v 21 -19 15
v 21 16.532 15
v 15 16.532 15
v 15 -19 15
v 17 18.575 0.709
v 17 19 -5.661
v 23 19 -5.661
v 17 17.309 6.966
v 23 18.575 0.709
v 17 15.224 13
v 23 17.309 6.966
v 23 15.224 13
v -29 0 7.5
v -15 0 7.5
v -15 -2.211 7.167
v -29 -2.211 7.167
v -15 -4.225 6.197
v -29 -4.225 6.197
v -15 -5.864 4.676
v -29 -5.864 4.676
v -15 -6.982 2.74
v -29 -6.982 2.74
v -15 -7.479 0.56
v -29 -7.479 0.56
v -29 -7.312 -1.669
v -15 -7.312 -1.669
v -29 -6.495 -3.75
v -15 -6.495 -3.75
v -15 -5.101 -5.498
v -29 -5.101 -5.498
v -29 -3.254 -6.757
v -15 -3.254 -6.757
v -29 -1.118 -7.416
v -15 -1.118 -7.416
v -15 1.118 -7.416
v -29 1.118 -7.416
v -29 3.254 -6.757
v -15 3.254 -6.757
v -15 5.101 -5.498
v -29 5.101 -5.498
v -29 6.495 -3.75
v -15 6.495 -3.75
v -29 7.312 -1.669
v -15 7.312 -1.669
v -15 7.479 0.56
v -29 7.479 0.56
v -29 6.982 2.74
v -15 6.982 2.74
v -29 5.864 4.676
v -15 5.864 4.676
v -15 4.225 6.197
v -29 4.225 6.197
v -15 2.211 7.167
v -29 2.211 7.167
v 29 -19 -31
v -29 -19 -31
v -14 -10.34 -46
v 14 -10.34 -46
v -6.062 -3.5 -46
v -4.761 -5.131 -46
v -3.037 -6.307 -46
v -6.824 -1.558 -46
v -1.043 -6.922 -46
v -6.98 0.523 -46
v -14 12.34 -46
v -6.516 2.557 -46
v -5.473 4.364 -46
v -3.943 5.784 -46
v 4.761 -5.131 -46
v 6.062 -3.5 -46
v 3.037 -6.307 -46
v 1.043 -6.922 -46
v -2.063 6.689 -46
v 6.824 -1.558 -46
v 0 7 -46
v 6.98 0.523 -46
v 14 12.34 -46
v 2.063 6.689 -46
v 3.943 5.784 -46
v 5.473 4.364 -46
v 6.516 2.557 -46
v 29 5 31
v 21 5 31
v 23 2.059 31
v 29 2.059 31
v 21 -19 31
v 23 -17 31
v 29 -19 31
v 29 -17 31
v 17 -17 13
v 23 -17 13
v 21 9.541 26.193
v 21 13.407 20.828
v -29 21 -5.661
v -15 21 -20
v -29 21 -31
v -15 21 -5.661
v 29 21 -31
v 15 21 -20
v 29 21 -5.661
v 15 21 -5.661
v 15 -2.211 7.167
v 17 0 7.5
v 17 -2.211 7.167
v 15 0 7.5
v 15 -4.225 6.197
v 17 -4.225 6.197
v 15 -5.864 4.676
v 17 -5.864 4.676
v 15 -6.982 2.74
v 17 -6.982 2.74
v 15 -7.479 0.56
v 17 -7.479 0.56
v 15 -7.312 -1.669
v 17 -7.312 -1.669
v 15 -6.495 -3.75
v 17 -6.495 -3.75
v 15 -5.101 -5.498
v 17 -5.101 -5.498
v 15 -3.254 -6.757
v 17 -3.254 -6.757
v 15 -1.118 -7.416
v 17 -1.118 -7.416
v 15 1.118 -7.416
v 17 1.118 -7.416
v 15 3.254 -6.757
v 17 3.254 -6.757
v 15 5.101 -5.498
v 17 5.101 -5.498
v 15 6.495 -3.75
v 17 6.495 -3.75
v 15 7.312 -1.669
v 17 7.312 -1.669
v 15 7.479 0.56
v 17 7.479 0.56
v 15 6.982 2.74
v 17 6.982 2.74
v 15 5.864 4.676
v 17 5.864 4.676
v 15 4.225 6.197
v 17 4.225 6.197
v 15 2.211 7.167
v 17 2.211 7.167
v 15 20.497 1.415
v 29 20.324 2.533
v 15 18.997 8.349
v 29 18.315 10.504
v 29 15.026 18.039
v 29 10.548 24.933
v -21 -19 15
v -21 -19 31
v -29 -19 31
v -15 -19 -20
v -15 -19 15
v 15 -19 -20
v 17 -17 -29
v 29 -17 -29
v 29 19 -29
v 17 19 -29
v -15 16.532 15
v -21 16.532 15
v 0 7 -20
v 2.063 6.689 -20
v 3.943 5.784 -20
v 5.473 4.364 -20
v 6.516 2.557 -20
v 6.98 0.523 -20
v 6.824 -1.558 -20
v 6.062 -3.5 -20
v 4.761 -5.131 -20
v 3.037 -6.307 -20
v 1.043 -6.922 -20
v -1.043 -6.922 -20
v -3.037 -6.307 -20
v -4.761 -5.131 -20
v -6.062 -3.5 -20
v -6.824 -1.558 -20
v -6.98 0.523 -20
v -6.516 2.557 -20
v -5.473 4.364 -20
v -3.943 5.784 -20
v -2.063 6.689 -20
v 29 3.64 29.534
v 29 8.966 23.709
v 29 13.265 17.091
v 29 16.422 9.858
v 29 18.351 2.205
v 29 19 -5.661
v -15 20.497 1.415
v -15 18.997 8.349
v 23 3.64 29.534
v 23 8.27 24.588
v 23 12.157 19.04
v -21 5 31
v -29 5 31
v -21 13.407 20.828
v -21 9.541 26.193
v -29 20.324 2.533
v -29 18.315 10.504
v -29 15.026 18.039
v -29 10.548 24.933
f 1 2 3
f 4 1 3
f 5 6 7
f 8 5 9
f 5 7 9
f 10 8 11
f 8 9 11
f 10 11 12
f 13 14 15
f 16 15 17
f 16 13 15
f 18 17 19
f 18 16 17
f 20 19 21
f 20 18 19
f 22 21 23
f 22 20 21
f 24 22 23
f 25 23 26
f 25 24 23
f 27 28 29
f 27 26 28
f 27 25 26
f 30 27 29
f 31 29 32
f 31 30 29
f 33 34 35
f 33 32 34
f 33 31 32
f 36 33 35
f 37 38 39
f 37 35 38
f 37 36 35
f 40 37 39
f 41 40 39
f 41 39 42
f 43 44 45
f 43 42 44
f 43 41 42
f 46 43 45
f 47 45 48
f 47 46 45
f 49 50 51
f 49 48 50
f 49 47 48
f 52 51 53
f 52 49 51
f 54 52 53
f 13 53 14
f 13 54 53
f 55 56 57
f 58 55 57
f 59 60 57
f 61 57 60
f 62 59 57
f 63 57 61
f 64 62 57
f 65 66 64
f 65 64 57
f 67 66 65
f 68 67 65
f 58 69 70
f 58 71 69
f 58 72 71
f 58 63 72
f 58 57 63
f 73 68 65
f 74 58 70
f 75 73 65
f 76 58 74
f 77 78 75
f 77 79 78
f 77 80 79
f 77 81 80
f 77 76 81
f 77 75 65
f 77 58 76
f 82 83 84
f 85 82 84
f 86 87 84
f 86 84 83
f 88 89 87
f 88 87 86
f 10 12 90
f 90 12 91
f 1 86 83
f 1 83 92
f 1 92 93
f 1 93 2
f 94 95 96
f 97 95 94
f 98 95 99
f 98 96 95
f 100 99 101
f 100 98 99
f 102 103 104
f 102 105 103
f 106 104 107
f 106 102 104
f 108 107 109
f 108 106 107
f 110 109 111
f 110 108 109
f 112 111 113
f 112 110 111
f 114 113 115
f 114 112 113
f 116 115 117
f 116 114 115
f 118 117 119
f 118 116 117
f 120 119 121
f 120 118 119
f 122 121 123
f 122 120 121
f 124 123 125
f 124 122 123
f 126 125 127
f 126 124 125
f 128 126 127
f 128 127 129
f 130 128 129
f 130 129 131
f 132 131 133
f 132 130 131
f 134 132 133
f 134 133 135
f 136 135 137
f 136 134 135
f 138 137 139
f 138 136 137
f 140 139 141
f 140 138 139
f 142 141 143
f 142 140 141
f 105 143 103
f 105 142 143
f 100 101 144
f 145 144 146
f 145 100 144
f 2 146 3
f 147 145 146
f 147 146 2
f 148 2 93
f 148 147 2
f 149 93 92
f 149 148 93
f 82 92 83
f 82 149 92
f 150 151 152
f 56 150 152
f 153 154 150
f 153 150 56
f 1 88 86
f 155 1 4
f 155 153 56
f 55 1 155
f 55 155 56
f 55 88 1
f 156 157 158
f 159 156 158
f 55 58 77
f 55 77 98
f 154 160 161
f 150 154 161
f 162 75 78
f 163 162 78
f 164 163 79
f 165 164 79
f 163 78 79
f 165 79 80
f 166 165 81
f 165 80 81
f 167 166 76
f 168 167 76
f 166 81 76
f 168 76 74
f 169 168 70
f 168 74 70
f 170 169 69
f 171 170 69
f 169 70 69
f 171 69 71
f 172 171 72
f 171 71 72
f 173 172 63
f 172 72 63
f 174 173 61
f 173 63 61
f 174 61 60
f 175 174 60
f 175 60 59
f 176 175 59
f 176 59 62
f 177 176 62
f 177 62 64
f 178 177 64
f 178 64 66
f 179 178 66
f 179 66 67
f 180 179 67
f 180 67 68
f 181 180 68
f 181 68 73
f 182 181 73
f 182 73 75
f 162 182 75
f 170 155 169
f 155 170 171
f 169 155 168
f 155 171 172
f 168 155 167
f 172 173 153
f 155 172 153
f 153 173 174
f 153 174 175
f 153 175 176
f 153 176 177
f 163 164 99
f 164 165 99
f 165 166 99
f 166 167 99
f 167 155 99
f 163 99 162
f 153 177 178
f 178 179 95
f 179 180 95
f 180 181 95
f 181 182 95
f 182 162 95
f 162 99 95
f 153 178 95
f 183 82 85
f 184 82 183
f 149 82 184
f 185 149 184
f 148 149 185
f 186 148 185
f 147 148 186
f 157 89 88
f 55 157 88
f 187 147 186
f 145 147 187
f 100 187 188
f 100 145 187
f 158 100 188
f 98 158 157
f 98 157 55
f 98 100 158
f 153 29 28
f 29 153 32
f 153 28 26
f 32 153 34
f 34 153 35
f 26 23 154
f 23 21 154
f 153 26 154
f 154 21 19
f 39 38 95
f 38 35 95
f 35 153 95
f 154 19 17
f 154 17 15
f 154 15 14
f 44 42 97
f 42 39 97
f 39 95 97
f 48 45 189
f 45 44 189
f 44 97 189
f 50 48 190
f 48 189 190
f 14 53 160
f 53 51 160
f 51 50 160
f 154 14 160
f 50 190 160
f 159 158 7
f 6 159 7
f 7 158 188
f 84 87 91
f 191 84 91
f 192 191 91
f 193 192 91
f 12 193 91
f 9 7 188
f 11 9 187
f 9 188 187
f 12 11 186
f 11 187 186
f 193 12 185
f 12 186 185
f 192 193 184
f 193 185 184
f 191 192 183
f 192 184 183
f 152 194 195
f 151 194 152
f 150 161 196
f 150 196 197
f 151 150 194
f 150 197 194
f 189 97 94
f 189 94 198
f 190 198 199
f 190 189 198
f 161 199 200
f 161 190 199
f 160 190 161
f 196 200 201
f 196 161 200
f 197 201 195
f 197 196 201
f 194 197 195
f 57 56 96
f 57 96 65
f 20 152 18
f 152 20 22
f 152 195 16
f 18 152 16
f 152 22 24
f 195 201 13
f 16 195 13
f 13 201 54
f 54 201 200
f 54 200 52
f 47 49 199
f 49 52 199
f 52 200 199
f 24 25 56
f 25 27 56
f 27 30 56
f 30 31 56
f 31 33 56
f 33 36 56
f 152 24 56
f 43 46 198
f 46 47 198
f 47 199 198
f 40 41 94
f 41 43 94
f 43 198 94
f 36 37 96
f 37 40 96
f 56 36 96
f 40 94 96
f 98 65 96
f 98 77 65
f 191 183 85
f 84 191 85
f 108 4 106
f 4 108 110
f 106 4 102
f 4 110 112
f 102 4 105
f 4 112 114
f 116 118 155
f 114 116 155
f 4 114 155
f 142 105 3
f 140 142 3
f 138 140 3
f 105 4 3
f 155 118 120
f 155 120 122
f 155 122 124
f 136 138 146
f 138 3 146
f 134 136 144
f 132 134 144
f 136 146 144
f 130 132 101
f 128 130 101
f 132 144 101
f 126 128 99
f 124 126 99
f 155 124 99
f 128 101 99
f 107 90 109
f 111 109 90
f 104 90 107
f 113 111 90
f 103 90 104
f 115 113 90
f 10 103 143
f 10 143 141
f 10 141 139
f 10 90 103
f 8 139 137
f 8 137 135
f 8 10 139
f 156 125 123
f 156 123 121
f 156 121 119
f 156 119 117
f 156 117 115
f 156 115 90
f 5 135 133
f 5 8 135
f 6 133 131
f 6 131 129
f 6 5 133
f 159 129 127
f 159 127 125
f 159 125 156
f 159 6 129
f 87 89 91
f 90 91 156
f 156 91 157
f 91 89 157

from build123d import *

# Parameters (mm, degrees)
SKETCH1_R           = 7.5
BOSS_EXTRUDE1_DEPTH = 29
CUT_EXTRUDE1_DEPTH  = 68.505555327
SKETCH3_R           = 7
CUT_EXTRUDE2_DEPTH  = 85.917607126
CUT_EXTRUDE3_DEPTH  = 68.505555438
CUT_EXTRUDE4_DEPTH  = 6
CUT_EXTRUDE5_DEPTH  = 6


with BuildPart() as part:
    # Sketch1 → Boss-Extrude1 (new, symmetric)
    with BuildSketch(Plane(origin=(0, 0, 0), x_dir=(0, 0, -1), z_dir=(1, 0, 0))):
        with BuildLine():
            Line((-31, 5), (-31, -19))
            Line((-31, -19), (31, -19))
            Line((31, -19), (46, -10.339745962))
            Line((46, -10.339745962), (46, 12.339745962))
            Line((46, 12.339745962), (31, 21))
            Line((31, 21), (5.66060556, 21))
            ThreePointArc((5.66060556, 21), (-14.33939444, 16.82575695), (-31, 5))
        make_face()
        with Locations(Location((0, 0, 0), (0, 0, 180))):
            Circle(SKETCH1_R, mode=Mode.SUBTRACT)
    extrude(amount=BOSS_EXTRUDE1_DEPTH, both=True)

    # Sketch2 → Cut-Extrude1 (cut, through all)
    with BuildSketch(Plane(origin=(0, 21, 0), x_dir=(1, 0, 0), z_dir=(0, 1, 0))):
        Polygon((-29, 31), (-14, 46), (-29, 46), align=None)
        Polygon((29, 31), (29, 46), (14, 46), align=None)
    extrude(amount=-CUT_EXTRUDE1_DEPTH, mode=Mode.SUBTRACT)

    # Sketch3 → Cut-Extrude2 (cut, through all)
    with BuildSketch(Plane(origin=(0, 0, -46), x_dir=(-1, 0, 0), z_dir=(0, 0, -1))):
        with Locations(Location((0, 0, 0), (0, 0, 90))):
            Circle(SKETCH3_R)
    extrude(amount=-CUT_EXTRUDE2_DEPTH, mode=Mode.SUBTRACT)

    # Sketch4 → Cut-Extrude3 (cut, through all)
    with BuildSketch(Plane(origin=(0, 21, 0), x_dir=(1, 0, 0), z_dir=(0, 1, 0))):
        Polygon((-21, -31), (21, -31), (21, -15), (15, -15), (15, 20), (-15, 20), (-15, -15), (-21, -15), align=None)
    extrude(amount=-CUT_EXTRUDE3_DEPTH, mode=Mode.SUBTRACT)

    # Sketch6 → Cut-Extrude4 (cut)
    with BuildSketch(Plane(origin=(29, 0, 0), x_dir=(0, 0, -1), z_dir=(1, 0, 0))):
        with BuildLine():
            Line((-31, 2.058823529), (-31, -17))
            Line((-31, -17), (29, -17))
            Line((29, -17), (29, 19))
            Line((29, 19), (5.66060556, 19))
            ThreePointArc((5.66060556, 19), (-13.53939444, 14.992726672), (-29.533575778, 3.64))
            Line((-29.533575778, 3.64), (-31, 2.058823529))
        make_face()
    extrude(amount=-CUT_EXTRUDE4_DEPTH, mode=Mode.SUBTRACT)

    # Sketch7 → Cut-Extrude5 (cut)
    with BuildSketch(Plane(origin=(23, 0, 0), x_dir=(0, 0, -1), z_dir=(1, 0, 0))):
        with BuildLine():
            Line((-13, -17), (29, -17))
            Line((29, -17), (29, 19))
            Line((29, 19), (5.66060556, 19))
            ThreePointArc((5.66060556, 19), (-3.858778616, 18.046586751), (-13, 15.224221872))
            Line((-13, 15.224221872), (-13, -17))
        make_face()
    extrude(amount=-CUT_EXTRUDE5_DEPTH, mode=Mode.SUBTRACT)


solid = part.part
